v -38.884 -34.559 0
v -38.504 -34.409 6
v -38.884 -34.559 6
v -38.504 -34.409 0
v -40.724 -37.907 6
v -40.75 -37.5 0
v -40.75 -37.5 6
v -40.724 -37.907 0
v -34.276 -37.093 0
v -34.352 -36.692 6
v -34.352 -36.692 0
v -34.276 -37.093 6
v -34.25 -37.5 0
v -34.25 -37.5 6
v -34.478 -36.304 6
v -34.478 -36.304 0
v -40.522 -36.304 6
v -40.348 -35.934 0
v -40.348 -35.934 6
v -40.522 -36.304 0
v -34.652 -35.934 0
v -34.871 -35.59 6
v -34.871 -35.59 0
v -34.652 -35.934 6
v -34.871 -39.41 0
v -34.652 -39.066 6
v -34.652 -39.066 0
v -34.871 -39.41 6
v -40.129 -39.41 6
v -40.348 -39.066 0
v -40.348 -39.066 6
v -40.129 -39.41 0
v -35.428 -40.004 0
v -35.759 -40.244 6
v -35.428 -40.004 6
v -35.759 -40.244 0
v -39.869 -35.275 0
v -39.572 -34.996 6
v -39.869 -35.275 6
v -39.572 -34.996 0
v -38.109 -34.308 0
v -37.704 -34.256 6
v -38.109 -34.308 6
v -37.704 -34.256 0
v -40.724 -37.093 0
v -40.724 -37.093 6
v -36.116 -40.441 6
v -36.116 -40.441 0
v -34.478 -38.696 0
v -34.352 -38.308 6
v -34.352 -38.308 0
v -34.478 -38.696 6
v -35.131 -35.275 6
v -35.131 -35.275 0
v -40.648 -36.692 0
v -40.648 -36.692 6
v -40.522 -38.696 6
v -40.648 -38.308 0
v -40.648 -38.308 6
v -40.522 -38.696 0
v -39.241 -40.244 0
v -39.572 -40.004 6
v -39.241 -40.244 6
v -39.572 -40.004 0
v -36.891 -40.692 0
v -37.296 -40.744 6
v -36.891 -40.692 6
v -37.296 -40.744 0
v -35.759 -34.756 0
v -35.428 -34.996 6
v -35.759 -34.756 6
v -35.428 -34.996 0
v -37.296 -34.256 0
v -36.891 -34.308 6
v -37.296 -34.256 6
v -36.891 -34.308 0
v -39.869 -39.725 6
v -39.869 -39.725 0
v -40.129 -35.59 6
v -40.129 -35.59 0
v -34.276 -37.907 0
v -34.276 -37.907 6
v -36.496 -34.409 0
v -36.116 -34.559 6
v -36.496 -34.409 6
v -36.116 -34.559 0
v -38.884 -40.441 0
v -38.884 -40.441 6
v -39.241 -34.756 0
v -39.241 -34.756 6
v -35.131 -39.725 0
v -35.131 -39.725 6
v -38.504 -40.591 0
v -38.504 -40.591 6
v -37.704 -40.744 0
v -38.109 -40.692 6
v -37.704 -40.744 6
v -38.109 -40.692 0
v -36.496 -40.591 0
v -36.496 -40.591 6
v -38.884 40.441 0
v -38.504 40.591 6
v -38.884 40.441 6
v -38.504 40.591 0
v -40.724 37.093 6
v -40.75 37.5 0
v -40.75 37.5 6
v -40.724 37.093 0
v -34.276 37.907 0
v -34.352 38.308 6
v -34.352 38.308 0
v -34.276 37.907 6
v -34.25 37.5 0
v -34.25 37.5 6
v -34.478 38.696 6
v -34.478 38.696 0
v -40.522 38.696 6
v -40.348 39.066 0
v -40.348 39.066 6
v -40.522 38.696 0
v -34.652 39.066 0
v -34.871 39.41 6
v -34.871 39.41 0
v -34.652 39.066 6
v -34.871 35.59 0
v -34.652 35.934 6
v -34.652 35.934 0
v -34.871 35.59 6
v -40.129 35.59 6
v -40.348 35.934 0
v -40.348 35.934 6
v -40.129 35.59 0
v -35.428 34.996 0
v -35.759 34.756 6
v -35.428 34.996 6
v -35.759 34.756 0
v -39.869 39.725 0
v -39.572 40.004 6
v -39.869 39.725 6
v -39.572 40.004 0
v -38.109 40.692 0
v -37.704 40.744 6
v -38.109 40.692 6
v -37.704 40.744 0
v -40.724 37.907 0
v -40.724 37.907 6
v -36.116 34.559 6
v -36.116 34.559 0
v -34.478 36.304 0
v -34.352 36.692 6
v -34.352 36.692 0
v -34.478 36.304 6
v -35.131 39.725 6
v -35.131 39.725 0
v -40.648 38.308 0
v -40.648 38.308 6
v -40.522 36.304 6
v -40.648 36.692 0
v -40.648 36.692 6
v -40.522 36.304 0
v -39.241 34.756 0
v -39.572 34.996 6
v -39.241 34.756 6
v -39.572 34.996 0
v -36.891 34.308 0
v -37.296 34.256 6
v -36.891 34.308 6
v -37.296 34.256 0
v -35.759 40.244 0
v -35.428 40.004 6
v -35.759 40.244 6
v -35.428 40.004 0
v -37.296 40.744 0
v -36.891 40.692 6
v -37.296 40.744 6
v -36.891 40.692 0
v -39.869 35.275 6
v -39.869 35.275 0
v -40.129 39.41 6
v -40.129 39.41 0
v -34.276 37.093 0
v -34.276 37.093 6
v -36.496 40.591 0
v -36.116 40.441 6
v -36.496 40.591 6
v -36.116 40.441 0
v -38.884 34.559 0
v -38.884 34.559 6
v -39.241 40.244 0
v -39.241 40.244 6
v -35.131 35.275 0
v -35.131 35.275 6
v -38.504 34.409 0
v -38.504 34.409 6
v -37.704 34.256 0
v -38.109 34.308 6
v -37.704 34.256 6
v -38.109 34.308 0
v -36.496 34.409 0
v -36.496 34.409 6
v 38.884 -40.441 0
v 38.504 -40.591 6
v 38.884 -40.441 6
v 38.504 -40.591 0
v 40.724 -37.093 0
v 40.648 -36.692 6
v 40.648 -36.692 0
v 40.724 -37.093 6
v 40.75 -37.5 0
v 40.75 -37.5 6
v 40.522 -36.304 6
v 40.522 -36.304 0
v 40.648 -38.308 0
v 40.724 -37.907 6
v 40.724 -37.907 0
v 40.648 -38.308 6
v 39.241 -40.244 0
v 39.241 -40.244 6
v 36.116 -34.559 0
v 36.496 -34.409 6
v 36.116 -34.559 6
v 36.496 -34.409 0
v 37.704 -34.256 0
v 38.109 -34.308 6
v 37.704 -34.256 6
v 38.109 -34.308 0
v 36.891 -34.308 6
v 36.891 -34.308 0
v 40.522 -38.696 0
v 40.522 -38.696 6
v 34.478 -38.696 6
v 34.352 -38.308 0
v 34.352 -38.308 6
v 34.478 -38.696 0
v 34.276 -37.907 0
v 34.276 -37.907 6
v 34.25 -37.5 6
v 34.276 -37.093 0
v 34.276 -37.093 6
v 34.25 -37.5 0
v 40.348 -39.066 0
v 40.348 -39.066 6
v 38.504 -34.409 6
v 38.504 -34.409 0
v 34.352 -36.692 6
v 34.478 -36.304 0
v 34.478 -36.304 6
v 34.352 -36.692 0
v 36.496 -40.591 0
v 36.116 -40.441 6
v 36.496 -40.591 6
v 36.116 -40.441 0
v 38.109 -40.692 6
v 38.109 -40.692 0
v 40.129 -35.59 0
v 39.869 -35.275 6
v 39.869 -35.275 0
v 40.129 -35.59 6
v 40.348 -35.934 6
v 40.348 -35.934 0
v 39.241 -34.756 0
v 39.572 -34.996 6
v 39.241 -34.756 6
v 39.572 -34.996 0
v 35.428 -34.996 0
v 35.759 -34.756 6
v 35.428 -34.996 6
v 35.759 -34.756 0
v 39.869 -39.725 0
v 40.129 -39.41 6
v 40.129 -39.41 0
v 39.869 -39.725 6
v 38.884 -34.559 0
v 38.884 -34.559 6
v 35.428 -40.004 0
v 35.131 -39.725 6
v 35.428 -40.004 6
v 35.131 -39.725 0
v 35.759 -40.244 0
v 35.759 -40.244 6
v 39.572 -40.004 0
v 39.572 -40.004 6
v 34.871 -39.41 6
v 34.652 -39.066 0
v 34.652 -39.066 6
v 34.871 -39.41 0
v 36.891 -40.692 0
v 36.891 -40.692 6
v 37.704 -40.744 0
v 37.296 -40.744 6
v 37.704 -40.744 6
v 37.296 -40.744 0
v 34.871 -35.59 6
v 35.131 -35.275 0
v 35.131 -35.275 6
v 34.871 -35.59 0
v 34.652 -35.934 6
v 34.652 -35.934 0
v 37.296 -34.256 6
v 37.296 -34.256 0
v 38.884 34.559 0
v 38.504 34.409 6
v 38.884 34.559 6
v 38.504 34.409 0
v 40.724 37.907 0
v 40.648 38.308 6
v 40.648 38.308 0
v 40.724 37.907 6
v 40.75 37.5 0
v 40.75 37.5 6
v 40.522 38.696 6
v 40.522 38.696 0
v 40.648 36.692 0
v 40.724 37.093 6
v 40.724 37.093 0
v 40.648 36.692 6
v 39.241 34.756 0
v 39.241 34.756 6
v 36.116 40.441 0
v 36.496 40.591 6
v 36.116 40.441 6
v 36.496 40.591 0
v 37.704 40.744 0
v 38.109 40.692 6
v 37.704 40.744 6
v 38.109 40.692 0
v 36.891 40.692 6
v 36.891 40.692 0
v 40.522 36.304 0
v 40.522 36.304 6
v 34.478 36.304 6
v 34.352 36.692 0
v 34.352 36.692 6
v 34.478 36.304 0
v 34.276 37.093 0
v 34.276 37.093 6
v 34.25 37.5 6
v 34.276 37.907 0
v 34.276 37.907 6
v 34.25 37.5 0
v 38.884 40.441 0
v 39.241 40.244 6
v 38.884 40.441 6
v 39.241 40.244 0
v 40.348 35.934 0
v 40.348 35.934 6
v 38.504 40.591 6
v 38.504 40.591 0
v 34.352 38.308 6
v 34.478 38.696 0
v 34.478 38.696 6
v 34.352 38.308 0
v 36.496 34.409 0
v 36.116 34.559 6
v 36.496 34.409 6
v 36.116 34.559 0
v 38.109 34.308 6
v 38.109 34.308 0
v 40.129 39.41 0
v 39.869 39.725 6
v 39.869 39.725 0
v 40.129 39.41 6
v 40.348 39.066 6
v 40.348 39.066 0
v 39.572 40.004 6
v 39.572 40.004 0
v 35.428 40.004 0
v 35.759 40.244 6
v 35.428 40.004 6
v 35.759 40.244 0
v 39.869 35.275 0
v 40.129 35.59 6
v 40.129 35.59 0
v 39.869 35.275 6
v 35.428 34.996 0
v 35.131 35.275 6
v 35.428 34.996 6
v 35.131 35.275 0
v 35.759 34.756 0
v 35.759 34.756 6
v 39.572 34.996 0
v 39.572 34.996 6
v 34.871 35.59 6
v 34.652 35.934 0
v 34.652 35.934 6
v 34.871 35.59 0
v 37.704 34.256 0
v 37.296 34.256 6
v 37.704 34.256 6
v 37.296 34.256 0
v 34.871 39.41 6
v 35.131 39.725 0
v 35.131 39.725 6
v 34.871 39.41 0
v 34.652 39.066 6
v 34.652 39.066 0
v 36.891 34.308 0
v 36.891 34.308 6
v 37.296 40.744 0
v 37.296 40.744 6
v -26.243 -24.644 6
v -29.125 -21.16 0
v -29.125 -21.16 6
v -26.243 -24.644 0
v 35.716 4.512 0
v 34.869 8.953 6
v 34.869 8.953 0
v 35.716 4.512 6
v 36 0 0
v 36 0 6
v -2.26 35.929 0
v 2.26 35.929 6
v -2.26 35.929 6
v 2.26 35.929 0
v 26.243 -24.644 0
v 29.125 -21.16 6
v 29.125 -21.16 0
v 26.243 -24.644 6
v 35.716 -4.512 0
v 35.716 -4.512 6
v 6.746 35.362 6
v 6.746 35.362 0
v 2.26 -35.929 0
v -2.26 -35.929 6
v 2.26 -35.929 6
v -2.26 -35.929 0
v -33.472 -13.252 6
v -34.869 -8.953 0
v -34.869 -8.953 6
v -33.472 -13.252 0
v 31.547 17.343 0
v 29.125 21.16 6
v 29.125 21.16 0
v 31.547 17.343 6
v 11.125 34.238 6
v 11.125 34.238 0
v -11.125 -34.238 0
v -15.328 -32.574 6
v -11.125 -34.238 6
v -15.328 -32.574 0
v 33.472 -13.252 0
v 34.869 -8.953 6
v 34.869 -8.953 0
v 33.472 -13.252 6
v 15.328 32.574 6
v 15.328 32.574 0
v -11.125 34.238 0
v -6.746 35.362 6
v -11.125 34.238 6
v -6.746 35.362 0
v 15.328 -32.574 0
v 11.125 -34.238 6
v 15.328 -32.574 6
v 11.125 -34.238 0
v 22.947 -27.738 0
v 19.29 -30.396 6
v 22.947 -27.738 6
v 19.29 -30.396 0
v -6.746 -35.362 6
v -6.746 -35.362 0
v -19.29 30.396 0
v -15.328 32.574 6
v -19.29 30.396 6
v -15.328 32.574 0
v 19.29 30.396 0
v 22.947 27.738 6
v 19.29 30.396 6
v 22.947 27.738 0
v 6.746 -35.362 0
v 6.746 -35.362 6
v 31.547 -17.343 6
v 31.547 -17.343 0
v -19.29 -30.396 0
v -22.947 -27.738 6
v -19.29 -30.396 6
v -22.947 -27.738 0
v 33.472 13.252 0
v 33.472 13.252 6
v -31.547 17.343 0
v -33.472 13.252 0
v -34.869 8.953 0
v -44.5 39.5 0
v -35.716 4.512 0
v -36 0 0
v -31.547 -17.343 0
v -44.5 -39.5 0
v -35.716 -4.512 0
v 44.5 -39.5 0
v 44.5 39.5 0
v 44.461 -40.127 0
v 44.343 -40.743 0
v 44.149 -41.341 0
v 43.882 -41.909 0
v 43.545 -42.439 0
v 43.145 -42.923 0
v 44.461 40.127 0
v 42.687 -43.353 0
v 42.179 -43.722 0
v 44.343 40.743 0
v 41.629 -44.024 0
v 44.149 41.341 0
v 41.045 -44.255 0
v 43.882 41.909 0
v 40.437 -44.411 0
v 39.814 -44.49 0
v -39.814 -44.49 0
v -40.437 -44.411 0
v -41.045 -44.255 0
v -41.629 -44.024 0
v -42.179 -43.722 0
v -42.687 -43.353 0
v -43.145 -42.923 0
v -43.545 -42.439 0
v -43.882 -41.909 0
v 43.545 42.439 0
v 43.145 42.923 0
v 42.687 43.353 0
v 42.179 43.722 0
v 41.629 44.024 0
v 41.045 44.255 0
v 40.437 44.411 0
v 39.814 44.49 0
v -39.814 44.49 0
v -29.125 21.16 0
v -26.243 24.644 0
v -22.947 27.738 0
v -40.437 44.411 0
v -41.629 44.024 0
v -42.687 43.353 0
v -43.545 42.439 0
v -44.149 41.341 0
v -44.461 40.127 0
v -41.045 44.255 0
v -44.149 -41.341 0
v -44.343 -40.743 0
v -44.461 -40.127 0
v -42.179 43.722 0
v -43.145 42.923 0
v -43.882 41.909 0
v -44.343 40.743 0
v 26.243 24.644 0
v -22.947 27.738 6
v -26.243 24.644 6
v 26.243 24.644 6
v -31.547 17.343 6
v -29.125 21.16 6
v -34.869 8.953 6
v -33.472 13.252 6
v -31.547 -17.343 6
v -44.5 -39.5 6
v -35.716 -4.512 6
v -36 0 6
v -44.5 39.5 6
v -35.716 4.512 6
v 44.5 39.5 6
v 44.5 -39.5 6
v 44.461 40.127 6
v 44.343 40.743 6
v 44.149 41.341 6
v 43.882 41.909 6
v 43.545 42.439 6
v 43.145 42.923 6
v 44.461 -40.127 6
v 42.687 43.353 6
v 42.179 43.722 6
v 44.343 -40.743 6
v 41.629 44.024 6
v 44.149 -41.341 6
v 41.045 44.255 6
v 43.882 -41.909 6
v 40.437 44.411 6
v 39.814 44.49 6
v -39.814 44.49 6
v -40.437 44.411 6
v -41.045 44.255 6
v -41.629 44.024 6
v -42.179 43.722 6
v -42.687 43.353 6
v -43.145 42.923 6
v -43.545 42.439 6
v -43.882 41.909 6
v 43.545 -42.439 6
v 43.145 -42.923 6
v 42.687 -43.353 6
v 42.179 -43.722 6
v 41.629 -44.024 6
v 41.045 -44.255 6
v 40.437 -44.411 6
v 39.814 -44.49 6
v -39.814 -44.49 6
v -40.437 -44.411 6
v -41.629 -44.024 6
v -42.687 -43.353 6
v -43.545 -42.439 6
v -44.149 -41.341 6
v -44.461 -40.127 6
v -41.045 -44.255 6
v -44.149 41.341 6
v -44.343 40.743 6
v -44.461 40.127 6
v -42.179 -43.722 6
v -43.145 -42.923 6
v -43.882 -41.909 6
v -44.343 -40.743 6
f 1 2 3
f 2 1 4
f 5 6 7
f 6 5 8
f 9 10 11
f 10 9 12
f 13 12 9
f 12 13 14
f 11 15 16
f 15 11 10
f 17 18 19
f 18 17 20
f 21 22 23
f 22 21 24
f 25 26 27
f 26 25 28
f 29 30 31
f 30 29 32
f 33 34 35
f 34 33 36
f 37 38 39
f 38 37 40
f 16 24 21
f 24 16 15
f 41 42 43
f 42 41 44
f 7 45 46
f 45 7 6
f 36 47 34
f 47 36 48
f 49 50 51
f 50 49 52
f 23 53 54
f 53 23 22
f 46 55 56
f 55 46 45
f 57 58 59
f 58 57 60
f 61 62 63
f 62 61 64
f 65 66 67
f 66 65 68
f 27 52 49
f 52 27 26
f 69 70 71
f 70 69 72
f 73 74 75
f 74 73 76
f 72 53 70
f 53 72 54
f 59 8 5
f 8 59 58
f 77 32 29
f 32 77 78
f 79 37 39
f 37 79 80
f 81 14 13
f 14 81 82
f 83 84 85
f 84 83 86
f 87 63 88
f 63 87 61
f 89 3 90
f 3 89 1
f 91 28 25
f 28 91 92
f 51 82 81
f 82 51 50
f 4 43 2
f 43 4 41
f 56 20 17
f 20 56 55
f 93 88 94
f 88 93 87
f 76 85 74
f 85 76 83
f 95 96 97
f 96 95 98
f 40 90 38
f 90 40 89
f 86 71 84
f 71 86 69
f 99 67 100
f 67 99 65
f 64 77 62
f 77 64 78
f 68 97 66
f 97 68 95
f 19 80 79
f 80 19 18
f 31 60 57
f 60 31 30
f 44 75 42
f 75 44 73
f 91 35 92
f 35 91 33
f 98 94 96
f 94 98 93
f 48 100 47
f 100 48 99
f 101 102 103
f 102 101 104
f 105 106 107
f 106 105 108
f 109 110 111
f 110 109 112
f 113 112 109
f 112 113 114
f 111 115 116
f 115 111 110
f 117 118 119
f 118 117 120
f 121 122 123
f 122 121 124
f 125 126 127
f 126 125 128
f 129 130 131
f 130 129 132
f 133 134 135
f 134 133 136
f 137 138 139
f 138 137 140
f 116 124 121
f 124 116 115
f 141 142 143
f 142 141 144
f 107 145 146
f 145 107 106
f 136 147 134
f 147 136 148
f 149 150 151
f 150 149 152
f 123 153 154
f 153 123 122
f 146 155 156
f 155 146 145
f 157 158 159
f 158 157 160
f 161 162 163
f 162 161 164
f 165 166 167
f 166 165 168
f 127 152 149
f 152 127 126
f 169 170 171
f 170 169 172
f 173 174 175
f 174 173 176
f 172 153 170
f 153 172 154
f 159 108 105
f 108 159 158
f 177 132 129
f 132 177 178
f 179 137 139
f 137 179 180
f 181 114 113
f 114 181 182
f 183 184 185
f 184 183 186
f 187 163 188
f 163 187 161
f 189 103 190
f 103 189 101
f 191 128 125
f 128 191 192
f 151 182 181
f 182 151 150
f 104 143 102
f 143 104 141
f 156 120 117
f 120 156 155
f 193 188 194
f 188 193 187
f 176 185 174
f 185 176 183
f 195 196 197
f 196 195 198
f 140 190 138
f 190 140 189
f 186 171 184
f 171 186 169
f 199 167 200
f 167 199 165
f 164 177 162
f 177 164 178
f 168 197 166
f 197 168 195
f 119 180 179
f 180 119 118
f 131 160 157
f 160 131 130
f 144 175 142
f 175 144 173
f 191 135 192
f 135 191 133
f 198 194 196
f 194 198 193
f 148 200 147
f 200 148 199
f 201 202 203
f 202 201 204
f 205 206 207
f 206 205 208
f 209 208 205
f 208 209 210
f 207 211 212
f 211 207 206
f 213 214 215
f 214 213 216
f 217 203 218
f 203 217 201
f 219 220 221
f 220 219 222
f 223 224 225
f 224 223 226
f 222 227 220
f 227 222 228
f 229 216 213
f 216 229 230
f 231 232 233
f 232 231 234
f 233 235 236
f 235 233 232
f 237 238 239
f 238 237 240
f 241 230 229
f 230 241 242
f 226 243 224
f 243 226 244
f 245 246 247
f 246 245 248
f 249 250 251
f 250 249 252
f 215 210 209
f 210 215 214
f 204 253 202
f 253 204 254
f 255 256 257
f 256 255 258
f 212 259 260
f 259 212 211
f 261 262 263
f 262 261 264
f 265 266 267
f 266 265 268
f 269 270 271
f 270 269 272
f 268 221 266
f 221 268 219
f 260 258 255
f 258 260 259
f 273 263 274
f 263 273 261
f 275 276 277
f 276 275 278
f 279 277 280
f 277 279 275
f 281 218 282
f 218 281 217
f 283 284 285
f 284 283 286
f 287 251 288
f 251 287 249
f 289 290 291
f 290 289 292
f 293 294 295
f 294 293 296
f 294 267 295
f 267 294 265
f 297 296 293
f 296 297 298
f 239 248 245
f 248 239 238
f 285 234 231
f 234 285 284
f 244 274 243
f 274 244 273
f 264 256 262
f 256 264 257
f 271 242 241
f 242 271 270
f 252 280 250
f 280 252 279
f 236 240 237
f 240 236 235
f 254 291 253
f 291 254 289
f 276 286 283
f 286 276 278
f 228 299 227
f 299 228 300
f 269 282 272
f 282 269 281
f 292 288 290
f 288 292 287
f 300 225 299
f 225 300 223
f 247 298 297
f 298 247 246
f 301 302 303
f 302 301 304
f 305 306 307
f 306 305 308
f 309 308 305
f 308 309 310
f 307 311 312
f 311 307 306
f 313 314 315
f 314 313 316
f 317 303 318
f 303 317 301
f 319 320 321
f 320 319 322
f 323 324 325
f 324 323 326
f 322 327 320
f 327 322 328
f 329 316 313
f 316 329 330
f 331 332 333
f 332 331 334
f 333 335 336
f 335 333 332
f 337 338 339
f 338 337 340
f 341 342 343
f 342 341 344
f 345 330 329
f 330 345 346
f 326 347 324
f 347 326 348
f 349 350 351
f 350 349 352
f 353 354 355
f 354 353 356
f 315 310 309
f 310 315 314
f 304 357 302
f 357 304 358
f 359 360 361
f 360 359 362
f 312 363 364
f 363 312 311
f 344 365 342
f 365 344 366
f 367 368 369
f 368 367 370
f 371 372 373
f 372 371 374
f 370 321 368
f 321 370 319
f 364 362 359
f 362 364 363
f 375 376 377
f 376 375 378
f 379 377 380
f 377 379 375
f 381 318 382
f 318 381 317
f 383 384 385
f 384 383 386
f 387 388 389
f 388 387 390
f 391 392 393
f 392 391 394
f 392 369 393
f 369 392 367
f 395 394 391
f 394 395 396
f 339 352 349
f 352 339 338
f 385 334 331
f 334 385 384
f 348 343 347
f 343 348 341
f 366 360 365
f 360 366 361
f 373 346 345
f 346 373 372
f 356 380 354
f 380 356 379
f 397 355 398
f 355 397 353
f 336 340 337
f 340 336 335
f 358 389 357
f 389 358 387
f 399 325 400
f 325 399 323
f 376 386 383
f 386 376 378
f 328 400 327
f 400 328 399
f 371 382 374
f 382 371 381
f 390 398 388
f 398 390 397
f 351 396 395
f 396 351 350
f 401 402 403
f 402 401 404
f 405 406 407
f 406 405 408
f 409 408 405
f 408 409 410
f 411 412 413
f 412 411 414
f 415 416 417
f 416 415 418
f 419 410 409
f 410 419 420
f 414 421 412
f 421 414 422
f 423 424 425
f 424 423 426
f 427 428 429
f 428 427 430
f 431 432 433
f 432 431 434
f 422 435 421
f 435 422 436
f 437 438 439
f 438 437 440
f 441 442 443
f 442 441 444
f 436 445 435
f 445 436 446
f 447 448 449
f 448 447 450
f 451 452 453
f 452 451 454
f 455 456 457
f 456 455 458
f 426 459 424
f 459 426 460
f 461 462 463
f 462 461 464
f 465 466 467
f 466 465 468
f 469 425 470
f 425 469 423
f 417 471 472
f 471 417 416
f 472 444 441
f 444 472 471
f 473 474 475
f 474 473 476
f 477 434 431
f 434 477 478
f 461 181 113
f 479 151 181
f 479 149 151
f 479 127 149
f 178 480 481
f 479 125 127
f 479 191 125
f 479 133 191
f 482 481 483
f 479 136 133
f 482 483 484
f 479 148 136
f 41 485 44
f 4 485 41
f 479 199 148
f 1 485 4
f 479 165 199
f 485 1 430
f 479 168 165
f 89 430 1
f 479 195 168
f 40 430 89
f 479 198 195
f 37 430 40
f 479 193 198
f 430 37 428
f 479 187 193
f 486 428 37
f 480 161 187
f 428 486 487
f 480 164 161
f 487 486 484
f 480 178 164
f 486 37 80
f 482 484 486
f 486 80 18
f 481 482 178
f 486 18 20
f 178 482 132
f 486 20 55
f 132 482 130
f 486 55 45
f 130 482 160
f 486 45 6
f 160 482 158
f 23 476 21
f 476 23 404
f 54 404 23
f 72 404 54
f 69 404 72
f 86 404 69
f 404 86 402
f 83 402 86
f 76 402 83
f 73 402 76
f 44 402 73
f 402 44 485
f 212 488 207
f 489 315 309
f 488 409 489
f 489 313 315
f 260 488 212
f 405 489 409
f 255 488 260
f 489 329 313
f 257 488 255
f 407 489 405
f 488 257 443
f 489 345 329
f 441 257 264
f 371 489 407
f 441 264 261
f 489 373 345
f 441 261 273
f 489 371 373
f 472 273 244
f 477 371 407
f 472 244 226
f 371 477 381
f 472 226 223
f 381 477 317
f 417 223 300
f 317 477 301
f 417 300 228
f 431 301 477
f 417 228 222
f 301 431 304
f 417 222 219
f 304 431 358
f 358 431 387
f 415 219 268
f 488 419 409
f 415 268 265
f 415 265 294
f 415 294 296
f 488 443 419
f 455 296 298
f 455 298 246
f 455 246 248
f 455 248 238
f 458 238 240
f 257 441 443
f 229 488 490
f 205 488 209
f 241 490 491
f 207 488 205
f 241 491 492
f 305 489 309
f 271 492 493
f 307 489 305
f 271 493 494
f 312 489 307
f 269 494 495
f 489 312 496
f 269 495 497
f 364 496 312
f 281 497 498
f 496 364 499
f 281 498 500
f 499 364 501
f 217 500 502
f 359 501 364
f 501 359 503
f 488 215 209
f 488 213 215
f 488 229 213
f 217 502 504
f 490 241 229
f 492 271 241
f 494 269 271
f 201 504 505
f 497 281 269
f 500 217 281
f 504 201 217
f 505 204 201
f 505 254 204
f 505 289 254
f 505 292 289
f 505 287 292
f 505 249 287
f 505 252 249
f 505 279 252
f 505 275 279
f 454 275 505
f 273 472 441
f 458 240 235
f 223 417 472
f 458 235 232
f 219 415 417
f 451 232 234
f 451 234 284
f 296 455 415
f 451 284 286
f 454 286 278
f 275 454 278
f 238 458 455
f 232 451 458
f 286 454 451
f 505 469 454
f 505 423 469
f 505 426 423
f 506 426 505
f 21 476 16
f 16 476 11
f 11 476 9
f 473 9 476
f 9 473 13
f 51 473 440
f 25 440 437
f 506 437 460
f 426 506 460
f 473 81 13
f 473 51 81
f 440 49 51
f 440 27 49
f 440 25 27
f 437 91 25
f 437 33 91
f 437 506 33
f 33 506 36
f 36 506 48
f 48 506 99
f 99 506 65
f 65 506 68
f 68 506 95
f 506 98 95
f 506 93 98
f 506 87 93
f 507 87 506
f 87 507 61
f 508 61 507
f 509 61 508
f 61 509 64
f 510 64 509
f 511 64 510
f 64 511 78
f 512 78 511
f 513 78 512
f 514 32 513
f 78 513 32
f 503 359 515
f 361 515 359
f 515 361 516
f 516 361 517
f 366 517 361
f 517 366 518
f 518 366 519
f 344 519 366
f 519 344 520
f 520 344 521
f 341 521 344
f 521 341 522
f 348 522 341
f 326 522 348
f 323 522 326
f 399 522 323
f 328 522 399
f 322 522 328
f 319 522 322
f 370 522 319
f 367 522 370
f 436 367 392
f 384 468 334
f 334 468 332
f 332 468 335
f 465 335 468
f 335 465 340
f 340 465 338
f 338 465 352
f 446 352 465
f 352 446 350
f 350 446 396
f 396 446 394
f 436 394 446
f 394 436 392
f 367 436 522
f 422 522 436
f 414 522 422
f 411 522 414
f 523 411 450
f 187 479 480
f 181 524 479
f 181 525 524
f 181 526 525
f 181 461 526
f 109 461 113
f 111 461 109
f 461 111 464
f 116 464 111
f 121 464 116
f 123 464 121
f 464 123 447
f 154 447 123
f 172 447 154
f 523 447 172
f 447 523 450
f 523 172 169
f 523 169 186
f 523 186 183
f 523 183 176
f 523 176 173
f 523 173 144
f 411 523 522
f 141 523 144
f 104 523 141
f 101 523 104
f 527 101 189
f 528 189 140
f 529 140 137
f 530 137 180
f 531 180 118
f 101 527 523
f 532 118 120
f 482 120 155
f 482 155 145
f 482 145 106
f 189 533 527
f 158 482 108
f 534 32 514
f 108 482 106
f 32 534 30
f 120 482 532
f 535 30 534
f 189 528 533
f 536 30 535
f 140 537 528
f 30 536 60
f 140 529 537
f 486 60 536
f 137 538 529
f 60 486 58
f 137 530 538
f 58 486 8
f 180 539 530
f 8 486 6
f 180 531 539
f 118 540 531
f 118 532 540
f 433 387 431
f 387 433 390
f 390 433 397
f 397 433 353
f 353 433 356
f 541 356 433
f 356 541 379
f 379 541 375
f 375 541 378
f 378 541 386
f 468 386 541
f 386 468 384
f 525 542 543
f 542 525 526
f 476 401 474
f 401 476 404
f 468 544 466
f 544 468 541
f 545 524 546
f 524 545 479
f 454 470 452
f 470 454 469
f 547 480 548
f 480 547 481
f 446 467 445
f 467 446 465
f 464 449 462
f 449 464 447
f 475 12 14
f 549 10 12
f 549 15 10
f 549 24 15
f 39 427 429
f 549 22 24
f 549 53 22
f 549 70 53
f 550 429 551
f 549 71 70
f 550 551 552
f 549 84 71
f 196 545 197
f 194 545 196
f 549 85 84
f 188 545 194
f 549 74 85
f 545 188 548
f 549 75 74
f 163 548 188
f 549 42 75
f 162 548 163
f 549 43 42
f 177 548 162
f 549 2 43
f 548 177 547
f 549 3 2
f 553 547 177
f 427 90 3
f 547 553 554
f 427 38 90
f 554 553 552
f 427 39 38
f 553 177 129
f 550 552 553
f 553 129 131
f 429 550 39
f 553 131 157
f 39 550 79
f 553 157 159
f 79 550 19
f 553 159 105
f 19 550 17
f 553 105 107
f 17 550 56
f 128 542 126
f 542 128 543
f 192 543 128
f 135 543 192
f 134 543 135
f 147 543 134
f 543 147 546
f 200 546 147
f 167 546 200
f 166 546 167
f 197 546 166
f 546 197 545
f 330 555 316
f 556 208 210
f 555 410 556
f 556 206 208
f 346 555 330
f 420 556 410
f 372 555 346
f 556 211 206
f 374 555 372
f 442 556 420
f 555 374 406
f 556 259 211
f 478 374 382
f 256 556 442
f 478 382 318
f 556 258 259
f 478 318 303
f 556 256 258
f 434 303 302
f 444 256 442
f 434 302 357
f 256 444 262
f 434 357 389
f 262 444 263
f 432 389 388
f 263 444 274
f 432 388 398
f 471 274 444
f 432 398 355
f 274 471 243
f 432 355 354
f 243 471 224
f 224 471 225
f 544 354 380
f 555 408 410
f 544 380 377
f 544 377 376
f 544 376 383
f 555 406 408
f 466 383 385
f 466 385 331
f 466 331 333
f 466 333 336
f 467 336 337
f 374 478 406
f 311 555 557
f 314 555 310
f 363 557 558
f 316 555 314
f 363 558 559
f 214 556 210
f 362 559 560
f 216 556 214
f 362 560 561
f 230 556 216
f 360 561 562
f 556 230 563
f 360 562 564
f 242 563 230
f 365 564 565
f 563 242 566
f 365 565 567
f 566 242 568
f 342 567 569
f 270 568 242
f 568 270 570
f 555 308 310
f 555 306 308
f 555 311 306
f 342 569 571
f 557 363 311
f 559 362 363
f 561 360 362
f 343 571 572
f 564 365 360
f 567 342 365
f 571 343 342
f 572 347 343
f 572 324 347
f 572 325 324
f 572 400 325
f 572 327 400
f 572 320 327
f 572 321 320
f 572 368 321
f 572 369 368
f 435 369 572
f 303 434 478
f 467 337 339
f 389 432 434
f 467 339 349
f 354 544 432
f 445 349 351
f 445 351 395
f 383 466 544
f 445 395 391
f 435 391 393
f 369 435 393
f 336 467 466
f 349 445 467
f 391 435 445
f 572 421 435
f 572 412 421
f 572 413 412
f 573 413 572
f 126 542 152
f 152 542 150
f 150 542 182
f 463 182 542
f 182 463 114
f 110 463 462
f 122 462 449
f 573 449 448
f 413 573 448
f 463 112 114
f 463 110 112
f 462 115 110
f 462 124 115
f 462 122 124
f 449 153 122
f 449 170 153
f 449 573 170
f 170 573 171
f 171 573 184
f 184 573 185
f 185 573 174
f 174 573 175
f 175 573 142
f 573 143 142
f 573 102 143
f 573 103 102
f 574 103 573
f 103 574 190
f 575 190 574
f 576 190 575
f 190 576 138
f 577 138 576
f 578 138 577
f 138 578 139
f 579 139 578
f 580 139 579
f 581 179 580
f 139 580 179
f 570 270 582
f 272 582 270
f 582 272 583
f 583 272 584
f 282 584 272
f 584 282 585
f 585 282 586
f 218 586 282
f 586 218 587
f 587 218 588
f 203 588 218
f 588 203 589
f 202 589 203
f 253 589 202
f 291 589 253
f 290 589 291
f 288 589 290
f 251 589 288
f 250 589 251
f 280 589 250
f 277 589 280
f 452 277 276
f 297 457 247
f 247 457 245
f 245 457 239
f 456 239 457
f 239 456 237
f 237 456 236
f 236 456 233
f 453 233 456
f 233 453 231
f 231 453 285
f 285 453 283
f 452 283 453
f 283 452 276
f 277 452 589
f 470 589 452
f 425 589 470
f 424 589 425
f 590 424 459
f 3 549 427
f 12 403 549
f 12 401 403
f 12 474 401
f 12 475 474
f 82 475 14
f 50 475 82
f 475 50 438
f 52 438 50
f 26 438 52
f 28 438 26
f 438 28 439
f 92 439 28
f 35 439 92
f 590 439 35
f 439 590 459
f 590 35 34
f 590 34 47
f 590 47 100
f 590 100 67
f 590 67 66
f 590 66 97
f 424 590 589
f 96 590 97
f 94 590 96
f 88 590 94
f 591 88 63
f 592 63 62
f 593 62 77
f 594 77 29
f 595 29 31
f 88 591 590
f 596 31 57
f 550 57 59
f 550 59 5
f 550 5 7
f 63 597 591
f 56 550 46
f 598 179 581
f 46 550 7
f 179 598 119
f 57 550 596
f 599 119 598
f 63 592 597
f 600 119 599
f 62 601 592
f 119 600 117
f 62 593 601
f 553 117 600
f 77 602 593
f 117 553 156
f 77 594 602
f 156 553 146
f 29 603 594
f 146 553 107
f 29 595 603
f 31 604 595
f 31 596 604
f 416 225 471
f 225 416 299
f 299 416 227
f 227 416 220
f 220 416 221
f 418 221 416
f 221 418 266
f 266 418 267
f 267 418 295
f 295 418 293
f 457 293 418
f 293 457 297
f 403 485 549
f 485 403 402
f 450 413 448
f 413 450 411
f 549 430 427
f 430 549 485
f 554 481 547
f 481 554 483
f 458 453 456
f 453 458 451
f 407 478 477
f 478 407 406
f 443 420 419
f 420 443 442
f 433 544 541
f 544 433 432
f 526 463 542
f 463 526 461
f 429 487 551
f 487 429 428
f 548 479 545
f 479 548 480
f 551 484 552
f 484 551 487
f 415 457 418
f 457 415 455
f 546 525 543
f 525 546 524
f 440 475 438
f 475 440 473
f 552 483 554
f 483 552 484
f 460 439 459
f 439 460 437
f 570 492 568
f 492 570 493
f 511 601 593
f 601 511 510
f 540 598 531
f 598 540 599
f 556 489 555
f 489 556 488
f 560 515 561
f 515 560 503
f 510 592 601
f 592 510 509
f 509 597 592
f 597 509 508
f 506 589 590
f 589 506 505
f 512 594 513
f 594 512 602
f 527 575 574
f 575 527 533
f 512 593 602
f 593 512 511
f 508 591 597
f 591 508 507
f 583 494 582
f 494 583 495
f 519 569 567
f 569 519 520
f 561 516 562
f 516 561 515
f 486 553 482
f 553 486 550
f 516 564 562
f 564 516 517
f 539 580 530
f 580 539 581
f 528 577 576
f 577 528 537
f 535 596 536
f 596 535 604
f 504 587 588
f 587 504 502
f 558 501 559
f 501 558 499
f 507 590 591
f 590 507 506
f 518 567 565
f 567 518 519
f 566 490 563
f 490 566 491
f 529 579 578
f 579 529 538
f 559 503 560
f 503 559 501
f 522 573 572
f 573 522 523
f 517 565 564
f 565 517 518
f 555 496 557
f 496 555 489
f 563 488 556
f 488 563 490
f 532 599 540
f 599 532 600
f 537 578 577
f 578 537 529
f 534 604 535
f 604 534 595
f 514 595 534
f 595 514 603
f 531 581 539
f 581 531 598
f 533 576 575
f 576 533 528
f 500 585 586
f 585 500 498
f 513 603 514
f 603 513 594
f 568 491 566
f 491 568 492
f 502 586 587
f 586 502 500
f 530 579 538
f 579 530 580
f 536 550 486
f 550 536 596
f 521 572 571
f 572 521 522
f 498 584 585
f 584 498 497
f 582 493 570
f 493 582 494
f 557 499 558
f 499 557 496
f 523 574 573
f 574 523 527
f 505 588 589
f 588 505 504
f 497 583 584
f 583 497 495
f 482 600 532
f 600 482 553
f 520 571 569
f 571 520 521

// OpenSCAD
$fn = 50;

difference() {
	union() {
		hull() {
			translate(v = [-39.5, 39.5, 0]) {
				cylinder(h = 6, r = 5);
			}
			translate(v = [39.5, 39.5, 0]) {
				cylinder(h = 6, r = 5);
			}
			translate(v = [-39.5, -39.5, 0]) {
				cylinder(h = 6, r = 5);
			}
			translate(v = [39.5, -39.5, 0]) {
				cylinder(h = 6, r = 5);
			}
		}
	}
	union() {
		translate(v = [-37.5, -37.5, -100.0]) {
			cylinder(h = 200, r = 3.25);
		}
		translate(v = [-37.5, 37.5, -100.0]) {
			cylinder(h = 200, r = 3.25);
		}
		translate(v = [37.5, -37.5, -100.0]) {
			cylinder(h = 200, r = 3.25);
		}
		translate(v = [37.5, 37.5, -100.0]) {
			cylinder(h = 200, r = 3.25);
		}
		translate(v = [-37.5, -37.5, -100.0]) {
			cylinder(h = 200, r = 1.8);
		}
		translate(v = [-37.5, 37.5, -100.0]) {
			cylinder(h = 200, r = 1.8);
		}
		translate(v = [37.5, -37.5, -100.0]) {
			cylinder(h = 200, r = 1.8);
		}
		translate(v = [37.5, 37.5, -100.0]) {
			cylinder(h = 200, r = 1.8);
		}
		cylinder(h = 6, r = 36.0);
	}
}
